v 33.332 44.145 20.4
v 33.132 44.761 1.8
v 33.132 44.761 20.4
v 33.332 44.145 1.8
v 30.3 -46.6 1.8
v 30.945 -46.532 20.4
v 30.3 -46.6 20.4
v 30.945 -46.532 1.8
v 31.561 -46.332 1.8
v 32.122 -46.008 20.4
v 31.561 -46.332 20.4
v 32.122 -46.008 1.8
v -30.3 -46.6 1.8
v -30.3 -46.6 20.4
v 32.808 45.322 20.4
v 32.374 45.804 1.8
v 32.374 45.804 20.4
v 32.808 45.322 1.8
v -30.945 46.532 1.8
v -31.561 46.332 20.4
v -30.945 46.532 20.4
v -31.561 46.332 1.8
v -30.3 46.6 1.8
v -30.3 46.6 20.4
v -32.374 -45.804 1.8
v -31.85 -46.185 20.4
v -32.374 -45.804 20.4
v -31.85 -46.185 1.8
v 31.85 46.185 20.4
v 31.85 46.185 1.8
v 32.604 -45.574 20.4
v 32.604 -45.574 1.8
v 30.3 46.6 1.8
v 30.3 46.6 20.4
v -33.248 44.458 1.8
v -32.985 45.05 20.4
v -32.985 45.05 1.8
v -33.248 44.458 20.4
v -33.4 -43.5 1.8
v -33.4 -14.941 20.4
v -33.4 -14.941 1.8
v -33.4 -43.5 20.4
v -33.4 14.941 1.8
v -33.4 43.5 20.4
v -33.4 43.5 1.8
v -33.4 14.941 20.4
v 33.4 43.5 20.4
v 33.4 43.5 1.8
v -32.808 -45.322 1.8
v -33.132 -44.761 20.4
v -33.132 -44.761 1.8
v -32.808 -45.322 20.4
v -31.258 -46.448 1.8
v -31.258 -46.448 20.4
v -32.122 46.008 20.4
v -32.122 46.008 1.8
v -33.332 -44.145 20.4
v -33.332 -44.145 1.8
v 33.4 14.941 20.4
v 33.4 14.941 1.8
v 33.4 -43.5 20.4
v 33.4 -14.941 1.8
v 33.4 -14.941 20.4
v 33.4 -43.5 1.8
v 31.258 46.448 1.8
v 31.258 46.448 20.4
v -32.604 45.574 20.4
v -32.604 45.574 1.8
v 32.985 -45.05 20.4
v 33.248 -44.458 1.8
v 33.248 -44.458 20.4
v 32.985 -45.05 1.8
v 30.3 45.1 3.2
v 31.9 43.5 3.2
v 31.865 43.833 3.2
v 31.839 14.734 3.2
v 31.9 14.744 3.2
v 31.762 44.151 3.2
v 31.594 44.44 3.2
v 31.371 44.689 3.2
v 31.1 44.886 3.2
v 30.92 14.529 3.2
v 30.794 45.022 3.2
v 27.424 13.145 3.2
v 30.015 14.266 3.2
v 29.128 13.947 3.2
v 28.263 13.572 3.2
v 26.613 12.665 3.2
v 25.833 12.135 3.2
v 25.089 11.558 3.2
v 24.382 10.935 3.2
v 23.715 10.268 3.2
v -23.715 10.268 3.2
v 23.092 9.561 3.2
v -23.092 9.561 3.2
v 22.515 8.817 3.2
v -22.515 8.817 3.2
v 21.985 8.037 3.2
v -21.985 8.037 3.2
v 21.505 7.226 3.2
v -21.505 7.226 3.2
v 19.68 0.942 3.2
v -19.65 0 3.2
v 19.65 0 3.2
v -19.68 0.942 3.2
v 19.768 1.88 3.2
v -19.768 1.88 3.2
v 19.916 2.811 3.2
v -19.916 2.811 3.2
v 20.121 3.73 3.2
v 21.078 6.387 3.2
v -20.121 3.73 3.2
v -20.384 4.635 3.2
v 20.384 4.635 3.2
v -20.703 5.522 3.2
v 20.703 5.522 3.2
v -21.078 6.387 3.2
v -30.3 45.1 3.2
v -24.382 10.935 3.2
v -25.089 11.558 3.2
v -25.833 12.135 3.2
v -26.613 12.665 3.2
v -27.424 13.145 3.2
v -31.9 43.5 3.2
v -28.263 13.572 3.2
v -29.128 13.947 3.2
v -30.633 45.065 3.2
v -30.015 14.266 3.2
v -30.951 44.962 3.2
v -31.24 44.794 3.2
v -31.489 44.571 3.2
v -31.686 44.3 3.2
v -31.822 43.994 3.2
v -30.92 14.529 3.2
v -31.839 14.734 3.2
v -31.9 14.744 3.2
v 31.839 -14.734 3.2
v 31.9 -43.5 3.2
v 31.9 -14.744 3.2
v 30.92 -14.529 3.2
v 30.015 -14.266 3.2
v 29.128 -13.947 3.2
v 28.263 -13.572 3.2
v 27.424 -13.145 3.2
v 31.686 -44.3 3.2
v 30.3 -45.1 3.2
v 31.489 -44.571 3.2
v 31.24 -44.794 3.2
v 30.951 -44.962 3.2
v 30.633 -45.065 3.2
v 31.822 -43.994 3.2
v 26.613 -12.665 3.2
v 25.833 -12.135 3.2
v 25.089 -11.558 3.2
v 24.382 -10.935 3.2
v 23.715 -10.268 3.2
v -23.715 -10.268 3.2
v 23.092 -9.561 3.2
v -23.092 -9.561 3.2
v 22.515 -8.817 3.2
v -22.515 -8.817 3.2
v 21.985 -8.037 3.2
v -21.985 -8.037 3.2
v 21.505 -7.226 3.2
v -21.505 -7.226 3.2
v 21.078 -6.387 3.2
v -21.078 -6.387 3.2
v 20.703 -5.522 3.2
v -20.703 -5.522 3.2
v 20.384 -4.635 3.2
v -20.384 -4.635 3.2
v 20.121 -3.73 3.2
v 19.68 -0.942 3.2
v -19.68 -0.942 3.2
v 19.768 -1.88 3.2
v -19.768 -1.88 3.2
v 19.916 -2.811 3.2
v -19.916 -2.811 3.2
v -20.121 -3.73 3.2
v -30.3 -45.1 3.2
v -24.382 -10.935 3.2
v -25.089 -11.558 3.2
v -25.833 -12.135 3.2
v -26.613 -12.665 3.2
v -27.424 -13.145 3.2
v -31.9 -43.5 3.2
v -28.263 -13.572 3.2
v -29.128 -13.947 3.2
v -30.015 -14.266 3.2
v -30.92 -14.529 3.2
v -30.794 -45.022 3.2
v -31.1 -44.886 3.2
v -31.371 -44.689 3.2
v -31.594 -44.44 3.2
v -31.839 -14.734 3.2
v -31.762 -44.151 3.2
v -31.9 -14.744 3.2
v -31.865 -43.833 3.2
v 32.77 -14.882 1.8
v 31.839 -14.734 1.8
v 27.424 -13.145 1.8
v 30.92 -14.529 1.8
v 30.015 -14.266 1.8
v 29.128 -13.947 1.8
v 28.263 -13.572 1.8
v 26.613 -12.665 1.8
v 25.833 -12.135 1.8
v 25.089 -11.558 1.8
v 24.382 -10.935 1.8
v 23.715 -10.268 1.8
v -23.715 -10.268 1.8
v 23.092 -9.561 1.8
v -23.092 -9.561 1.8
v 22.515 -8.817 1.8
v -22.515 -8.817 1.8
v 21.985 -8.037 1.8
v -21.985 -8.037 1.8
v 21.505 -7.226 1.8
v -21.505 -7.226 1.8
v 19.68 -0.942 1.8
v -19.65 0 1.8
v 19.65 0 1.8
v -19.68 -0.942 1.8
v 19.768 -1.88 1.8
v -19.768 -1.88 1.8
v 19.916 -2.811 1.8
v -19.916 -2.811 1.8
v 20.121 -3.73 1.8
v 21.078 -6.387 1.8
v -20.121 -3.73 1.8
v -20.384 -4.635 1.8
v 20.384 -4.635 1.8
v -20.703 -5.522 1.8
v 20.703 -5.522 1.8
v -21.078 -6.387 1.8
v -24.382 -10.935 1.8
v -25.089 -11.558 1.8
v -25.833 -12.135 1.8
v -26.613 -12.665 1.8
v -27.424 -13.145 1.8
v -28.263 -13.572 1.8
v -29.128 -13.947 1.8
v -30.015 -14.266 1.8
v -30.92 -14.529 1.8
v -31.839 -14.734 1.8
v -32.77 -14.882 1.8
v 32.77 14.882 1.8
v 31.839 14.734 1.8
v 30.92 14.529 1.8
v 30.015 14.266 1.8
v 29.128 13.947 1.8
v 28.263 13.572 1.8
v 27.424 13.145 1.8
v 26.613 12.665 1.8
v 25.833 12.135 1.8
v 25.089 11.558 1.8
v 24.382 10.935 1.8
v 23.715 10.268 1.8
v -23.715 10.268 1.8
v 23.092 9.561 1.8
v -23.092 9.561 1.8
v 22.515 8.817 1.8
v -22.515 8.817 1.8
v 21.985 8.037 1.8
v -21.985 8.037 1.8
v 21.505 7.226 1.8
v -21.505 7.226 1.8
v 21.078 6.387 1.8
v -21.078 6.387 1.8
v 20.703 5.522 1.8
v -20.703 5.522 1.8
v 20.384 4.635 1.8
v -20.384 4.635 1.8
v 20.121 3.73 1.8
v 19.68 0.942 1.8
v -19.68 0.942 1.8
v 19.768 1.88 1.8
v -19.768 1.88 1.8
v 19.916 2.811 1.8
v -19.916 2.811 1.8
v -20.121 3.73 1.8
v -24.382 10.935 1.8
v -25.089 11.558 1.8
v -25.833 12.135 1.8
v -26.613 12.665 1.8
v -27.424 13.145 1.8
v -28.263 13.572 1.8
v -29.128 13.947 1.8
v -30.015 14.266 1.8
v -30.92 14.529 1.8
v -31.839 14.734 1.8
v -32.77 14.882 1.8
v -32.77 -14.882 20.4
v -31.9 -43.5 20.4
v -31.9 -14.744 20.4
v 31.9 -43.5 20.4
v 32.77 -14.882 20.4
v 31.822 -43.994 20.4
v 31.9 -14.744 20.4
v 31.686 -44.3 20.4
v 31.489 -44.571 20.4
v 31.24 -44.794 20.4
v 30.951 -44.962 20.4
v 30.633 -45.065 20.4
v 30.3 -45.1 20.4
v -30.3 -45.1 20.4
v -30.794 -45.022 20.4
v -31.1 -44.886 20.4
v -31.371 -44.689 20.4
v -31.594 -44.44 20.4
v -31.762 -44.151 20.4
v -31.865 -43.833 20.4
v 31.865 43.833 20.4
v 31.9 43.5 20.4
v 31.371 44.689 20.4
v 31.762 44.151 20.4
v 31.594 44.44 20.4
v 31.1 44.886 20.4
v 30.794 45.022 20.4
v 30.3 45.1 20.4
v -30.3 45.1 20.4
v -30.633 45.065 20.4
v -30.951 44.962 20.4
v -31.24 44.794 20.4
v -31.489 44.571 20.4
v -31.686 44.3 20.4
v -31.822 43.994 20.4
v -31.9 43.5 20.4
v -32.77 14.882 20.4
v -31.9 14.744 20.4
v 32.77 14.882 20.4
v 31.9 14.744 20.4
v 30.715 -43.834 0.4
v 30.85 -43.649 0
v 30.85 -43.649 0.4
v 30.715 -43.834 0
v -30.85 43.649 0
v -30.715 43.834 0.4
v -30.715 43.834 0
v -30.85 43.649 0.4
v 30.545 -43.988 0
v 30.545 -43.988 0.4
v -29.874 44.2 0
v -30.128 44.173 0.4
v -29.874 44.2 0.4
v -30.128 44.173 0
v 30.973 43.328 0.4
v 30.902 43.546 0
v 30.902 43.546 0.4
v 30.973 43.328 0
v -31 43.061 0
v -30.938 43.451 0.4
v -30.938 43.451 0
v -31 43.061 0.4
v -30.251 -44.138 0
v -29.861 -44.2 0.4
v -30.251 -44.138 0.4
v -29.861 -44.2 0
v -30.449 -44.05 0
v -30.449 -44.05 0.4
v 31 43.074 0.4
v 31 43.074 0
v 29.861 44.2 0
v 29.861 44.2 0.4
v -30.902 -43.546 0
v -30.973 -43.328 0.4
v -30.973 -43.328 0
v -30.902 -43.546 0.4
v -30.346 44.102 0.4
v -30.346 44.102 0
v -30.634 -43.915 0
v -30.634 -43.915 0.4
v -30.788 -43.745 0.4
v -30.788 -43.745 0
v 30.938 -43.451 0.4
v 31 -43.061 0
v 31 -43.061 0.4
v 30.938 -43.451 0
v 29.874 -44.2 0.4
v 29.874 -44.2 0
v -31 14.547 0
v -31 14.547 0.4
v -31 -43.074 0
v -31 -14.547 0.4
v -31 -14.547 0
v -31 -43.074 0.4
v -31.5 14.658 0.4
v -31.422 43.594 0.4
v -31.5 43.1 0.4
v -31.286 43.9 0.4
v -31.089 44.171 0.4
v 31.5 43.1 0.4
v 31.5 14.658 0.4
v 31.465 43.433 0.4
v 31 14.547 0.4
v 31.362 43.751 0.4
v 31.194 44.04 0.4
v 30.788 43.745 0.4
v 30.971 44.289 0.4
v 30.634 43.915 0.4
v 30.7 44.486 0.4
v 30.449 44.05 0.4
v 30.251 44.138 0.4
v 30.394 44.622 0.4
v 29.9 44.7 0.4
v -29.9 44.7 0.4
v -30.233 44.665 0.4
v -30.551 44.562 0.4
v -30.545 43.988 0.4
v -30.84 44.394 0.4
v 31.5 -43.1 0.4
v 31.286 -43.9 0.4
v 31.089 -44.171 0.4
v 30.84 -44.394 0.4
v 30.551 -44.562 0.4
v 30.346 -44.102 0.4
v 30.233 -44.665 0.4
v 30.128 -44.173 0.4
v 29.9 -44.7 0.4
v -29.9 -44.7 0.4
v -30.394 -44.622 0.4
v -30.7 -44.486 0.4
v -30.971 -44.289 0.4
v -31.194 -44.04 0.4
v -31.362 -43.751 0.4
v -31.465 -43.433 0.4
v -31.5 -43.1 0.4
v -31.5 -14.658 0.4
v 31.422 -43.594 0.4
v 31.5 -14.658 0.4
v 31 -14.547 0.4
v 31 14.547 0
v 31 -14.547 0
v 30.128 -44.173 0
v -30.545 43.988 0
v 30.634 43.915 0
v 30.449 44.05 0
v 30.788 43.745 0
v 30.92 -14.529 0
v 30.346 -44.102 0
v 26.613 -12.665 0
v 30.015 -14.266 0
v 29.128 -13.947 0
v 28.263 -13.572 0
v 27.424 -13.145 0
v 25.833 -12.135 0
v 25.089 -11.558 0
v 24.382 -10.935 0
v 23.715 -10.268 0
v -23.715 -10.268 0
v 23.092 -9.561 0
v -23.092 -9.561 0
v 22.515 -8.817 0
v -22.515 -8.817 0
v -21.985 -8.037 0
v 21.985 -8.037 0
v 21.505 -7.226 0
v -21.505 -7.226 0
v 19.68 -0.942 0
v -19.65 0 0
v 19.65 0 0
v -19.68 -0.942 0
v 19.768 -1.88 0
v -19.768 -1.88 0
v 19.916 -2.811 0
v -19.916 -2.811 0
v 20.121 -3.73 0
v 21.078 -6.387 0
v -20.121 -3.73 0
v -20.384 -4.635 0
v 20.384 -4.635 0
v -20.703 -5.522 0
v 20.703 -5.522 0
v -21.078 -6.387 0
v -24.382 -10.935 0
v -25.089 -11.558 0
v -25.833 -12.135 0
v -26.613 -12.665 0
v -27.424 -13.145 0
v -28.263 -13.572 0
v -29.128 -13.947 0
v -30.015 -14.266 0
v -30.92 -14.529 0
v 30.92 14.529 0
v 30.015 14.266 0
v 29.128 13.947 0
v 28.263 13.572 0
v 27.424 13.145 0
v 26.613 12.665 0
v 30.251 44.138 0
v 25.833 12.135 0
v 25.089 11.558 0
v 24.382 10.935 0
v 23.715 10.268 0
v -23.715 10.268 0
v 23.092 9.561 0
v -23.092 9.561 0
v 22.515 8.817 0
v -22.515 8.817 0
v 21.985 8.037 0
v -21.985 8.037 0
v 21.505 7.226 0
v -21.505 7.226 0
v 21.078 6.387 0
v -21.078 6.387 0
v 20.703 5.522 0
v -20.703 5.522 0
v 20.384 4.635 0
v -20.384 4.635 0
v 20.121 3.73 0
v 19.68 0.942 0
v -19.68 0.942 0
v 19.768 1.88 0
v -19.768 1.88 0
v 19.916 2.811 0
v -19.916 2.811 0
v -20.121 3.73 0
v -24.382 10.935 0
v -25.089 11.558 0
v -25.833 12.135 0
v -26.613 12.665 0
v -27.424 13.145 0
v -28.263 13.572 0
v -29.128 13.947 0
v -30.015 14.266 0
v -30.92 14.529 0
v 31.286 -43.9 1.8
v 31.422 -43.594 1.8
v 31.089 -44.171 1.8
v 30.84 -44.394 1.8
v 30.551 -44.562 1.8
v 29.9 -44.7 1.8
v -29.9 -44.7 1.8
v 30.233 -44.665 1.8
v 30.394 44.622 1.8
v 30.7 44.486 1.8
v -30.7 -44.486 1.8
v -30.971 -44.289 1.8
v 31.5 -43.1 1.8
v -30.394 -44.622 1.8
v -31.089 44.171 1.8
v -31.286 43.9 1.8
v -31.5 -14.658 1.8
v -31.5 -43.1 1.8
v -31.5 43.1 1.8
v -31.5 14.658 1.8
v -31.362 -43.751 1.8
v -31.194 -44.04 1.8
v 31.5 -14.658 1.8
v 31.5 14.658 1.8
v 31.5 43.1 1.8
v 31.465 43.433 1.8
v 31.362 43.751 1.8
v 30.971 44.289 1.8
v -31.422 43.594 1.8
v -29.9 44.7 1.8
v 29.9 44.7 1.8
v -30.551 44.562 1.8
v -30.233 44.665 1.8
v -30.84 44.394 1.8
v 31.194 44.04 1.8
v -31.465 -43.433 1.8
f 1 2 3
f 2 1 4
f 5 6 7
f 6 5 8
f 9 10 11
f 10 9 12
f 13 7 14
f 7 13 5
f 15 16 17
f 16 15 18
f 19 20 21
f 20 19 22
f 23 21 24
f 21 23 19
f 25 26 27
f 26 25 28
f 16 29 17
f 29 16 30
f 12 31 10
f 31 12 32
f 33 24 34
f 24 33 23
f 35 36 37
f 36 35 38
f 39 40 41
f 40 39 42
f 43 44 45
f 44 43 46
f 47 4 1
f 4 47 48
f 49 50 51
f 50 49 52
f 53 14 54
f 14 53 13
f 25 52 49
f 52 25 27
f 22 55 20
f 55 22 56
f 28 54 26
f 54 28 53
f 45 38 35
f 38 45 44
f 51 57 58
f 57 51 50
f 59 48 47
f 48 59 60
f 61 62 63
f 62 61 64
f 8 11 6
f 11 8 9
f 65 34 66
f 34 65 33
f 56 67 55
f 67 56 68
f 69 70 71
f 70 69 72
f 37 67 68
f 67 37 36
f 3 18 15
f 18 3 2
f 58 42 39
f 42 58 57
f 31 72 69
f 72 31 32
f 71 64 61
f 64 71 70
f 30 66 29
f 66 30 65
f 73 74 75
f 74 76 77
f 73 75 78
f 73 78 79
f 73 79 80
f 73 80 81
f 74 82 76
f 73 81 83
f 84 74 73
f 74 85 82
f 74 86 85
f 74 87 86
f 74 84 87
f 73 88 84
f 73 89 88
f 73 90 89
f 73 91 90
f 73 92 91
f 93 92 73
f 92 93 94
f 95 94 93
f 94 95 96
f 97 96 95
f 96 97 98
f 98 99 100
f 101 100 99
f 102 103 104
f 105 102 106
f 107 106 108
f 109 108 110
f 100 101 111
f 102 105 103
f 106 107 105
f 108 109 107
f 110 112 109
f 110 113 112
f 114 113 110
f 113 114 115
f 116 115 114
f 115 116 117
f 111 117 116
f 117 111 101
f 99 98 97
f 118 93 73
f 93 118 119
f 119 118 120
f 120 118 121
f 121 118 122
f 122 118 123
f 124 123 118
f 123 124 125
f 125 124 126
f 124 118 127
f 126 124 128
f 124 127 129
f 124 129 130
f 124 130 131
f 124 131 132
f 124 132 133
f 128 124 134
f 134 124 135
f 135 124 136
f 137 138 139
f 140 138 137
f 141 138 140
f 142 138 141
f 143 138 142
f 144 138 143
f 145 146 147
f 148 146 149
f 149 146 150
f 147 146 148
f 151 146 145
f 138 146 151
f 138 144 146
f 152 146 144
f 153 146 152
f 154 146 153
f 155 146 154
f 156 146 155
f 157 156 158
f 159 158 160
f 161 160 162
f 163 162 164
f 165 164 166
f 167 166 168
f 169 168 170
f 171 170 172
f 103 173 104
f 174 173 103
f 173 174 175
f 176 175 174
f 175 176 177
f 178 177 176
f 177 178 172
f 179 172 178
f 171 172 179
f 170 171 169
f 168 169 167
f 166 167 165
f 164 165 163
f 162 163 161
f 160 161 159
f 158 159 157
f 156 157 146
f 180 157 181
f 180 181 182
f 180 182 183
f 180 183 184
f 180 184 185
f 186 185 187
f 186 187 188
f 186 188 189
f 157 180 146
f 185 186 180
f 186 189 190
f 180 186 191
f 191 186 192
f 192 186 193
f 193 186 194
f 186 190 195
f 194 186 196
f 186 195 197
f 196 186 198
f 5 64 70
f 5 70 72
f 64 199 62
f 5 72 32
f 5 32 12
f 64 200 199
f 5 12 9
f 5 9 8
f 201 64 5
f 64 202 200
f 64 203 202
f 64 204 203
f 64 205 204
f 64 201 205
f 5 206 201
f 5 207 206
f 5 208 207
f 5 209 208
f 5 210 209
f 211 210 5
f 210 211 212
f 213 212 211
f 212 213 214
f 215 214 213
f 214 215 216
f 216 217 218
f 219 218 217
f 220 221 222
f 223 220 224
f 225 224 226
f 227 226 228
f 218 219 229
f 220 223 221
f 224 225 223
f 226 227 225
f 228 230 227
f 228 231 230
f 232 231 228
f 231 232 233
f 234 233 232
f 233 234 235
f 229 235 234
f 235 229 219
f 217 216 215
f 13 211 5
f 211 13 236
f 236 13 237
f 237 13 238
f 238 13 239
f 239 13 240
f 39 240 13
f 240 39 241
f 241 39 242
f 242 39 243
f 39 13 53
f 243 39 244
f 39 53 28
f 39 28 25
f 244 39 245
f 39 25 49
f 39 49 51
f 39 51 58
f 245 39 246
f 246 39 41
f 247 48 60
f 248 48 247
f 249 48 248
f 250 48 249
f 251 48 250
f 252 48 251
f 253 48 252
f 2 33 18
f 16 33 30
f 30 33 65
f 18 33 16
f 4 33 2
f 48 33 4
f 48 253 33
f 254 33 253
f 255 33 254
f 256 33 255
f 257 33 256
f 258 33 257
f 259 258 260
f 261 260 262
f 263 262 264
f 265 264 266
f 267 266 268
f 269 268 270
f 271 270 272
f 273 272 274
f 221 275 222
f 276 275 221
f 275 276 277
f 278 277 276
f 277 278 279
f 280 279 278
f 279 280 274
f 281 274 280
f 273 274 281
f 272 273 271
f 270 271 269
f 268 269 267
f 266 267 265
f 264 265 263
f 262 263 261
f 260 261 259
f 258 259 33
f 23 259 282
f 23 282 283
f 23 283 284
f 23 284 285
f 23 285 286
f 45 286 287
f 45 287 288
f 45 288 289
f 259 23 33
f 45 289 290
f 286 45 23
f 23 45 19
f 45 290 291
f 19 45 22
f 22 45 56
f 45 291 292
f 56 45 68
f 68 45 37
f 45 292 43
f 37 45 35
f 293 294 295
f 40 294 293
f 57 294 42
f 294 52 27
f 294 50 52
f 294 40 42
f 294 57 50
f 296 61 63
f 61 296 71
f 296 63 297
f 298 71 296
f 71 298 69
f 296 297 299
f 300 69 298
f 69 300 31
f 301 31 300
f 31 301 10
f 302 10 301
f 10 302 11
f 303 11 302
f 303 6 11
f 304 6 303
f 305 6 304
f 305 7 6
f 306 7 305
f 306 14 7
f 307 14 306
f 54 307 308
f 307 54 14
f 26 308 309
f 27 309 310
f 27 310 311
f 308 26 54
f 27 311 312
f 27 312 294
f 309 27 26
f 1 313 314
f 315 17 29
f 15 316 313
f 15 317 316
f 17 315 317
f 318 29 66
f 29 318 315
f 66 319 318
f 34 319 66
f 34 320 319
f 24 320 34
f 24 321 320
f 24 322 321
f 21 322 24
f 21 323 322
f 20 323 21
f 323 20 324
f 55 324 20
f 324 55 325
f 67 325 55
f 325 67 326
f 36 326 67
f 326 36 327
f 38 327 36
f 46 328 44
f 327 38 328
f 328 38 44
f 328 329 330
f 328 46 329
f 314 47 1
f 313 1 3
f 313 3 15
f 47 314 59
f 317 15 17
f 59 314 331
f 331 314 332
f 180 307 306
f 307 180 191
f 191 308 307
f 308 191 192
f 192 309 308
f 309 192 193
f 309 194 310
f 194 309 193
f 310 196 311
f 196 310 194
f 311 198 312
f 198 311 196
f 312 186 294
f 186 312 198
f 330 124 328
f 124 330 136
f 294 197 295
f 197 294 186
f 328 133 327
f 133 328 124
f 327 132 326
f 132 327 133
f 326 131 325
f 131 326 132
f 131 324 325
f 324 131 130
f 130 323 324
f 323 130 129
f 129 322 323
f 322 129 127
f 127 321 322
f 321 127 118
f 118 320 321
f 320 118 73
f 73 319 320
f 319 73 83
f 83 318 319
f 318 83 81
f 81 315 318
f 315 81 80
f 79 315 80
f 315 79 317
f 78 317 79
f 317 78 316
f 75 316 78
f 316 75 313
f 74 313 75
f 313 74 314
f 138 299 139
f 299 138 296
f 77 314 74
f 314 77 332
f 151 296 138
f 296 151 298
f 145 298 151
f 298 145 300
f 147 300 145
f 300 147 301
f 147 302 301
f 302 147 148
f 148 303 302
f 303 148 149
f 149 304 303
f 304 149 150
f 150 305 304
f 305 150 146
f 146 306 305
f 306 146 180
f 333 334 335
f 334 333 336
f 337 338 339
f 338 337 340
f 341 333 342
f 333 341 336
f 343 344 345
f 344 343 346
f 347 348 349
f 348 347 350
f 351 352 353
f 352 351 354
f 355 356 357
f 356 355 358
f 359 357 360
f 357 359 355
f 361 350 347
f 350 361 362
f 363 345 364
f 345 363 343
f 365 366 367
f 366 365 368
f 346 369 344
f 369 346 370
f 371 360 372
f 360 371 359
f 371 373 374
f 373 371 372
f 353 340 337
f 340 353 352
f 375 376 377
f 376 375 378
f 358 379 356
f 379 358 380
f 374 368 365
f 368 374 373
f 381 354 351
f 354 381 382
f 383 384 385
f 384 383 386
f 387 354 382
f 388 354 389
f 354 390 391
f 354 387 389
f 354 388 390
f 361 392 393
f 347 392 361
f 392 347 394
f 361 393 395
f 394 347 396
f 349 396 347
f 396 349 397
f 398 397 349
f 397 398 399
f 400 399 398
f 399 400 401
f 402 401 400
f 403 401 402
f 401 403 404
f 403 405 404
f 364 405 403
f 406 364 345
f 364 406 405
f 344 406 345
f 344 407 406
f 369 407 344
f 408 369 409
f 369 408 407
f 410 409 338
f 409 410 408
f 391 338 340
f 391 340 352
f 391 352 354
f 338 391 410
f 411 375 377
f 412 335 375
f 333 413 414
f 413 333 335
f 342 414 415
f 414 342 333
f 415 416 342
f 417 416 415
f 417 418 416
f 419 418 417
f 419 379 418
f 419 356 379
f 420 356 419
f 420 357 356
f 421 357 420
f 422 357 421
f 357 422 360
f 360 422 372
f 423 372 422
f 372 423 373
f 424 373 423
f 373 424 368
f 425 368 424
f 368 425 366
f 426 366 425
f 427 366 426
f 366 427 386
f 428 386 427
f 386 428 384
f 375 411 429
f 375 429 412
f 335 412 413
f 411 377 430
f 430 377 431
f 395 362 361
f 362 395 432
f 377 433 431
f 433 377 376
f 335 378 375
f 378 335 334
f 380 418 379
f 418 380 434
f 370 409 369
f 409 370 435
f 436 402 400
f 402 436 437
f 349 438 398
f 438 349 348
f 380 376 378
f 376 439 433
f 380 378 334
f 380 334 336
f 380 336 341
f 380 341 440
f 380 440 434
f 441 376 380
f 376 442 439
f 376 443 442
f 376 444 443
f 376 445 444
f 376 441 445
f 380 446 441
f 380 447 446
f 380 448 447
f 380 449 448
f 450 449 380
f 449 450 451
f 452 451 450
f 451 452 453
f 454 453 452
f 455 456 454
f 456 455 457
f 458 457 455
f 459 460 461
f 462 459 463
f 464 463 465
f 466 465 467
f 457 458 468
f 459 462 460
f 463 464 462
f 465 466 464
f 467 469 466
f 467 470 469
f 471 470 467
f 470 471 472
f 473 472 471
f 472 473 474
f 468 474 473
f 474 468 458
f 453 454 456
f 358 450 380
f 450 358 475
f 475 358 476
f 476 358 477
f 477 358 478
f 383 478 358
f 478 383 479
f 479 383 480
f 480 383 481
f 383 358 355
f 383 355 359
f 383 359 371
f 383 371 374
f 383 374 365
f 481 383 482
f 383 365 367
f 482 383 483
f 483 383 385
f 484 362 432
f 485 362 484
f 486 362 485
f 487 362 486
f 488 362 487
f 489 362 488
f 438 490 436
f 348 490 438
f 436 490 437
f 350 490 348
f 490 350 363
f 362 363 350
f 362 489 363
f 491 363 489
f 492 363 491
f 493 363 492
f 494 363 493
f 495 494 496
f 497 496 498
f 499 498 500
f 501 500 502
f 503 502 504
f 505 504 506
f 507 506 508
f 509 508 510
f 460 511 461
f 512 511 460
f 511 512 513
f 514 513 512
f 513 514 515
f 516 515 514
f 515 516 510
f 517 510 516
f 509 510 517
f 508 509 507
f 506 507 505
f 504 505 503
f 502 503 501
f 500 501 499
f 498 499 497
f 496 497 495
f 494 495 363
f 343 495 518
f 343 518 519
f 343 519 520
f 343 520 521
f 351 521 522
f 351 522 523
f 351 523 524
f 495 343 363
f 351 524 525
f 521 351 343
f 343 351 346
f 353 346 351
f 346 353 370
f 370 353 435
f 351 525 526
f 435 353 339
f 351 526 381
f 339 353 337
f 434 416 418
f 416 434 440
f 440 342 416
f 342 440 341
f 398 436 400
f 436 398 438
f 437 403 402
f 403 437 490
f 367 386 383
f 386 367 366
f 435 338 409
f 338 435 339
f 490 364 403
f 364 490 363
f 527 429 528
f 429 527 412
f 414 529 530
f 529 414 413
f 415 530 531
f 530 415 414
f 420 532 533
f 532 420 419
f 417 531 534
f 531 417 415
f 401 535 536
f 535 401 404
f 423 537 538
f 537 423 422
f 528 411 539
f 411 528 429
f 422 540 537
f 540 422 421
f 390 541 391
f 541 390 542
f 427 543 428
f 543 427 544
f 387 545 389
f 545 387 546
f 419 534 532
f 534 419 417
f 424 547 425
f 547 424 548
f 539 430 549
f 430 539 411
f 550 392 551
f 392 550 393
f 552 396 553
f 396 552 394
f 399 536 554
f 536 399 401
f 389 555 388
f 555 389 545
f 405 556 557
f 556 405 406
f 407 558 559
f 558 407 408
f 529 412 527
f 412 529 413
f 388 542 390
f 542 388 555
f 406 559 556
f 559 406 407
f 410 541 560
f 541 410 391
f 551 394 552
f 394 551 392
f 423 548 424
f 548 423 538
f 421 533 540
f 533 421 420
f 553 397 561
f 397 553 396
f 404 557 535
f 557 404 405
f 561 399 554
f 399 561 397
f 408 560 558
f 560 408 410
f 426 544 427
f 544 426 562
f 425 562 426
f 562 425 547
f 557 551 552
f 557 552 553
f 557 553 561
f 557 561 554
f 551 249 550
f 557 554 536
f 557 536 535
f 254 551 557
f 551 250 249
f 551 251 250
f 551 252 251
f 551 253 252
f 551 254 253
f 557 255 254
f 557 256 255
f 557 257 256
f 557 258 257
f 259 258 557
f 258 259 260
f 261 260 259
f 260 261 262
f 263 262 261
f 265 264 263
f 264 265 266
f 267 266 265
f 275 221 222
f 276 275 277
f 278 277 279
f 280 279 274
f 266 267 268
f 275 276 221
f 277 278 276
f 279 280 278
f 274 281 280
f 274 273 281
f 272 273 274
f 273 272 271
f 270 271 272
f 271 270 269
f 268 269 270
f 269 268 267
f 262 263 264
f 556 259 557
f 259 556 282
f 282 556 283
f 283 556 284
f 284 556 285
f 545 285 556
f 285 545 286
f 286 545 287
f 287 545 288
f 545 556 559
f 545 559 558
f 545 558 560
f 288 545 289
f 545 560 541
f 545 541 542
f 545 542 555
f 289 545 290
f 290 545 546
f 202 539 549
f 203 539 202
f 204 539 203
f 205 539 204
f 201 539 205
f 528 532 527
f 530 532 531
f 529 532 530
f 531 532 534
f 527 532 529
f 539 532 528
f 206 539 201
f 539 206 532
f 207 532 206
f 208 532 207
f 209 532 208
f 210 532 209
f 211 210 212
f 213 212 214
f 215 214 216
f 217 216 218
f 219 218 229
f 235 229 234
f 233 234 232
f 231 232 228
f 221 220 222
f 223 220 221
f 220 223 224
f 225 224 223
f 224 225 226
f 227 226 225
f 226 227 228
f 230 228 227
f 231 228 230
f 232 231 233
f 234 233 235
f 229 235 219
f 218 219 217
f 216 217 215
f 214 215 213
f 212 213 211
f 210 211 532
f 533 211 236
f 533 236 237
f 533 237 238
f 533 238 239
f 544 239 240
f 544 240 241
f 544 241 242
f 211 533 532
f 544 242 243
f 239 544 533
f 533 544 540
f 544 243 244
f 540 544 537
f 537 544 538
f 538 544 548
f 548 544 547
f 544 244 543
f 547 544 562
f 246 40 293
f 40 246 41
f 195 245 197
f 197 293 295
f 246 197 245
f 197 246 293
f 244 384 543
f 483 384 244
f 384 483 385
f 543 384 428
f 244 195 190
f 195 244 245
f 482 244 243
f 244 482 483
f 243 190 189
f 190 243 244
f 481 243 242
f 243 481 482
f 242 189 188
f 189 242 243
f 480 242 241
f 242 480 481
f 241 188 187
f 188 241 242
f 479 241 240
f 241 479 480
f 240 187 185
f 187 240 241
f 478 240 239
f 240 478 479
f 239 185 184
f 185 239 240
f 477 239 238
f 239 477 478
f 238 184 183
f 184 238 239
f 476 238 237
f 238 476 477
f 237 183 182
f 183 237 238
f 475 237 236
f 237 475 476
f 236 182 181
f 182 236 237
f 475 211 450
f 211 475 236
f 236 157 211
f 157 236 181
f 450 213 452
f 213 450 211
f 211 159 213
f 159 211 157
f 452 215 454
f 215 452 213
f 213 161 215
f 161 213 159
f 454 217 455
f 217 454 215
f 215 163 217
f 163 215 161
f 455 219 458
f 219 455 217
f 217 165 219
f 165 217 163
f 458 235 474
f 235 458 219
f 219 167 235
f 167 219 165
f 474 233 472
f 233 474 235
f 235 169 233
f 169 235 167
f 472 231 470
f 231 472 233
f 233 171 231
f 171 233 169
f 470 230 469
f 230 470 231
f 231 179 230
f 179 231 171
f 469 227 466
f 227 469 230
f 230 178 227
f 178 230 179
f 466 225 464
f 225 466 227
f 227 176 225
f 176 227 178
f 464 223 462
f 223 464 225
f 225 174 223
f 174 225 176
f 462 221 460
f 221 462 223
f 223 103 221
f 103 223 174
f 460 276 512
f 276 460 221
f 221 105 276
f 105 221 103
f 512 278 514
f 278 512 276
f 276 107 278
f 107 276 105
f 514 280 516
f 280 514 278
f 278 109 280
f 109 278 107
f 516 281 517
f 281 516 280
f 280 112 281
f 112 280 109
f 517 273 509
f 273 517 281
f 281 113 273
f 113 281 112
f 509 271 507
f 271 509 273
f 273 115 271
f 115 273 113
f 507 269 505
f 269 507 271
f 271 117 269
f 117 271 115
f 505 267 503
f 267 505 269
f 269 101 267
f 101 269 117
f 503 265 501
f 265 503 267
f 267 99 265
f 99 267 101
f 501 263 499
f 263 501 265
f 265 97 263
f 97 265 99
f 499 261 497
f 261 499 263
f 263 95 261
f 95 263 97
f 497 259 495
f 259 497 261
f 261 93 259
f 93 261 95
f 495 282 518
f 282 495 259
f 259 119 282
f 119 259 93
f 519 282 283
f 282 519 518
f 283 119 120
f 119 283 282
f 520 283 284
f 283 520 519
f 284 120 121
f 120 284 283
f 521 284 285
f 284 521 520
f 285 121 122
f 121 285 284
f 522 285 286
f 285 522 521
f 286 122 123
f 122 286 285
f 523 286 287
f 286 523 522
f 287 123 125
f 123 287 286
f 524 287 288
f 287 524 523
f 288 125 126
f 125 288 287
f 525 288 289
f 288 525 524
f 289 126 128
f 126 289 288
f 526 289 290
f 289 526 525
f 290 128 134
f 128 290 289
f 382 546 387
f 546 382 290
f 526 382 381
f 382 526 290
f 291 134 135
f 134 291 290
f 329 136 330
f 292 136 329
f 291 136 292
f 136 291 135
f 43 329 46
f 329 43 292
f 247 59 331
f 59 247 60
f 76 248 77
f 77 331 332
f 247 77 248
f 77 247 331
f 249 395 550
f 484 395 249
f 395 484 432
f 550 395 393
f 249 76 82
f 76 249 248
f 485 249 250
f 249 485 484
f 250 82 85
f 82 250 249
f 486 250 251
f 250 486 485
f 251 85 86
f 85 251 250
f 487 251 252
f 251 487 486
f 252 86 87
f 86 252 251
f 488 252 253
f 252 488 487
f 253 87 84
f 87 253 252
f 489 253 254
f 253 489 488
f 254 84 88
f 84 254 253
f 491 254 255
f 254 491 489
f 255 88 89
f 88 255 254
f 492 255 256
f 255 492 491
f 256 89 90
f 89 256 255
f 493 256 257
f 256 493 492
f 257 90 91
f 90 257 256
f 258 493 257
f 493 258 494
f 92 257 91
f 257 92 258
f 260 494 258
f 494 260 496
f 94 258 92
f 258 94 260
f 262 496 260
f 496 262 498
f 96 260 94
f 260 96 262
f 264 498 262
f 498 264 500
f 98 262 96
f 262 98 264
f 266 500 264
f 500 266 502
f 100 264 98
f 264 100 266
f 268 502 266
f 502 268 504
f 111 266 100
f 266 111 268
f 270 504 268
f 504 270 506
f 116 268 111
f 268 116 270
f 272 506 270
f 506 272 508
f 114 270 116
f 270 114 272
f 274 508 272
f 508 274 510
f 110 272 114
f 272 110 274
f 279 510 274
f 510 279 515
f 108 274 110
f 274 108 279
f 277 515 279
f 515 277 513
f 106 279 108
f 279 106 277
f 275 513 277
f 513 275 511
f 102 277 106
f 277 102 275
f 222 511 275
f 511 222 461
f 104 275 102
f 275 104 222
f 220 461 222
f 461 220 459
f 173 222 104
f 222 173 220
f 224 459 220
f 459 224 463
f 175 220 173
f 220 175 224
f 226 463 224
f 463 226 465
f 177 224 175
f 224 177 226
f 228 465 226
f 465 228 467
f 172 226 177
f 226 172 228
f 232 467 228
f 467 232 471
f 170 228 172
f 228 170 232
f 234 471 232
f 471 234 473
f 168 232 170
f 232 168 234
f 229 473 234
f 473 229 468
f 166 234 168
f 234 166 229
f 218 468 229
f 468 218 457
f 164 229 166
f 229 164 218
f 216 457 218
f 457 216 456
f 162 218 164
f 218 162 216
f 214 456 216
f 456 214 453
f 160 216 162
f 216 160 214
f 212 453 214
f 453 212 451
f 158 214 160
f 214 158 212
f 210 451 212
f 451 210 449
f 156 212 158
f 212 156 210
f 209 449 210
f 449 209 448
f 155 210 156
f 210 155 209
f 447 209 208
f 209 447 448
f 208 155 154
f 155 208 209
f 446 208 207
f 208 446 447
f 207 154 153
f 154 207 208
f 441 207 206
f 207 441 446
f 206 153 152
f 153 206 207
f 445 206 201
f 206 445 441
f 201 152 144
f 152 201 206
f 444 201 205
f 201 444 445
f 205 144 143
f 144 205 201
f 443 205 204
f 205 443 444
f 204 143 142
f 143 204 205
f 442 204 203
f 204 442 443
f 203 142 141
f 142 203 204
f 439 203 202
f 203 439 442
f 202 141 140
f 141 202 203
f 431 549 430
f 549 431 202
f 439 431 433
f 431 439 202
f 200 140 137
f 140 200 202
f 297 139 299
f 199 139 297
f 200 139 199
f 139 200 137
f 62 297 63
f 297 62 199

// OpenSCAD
eps = 0.0001;
$fn = 30;

coin_d = 19;
coin_height = 2.4;

foot = 0.5;

module coin_2d() {
  $fn = 100;
  difference() {
    circle(d=coin_d);
    scale([0.75, 1])
      rotate([0, 0, 45])
        square(coin_d*0.42, center=true);
  }
}

module coin() {
  linear_extrude(0.2)
    offset(-foot)
      coin_2d();
  translate([0, 0, 0.2])
    linear_extrude(coin_height - 0.2)
      coin_2d();
}

card_width = 63;
card_height = 89.4;

cavity_slack = 0.8;
wall = 1.5;
flor = 1.4;
deck_thickness = 13;
height_slack = 4.2;

roundoff = 1.6;
protrusion = 1.8;

module cavity_2d() {
  offset(roundoff)
    offset(-roundoff)
      square([card_width + cavity_slack, card_height + cavity_slack], center=true);
}

module protrusion_2d() {
  offset(roundoff)
    offset(-roundoff)
      square([card_width, card_height], center=true);
}

module box_2d() {
 offset(roundoff + wall)
   offset(-roundoff - wall)
     square([card_width + cavity_slack + wall*2, card_height + cavity_slack + wall*2], center=true);
}

module fingers_2d() {
  $fn = 100;
  for (a = [-1, 1])
    scale([a, 1])
      translate([card_width*0.55, 0, 0])
        circle(15);
}

module box() {
  linear_extrude(0.4)
    offset(-foot)
      protrusion_2d();
  
  translate([0, 0, 0.4])
    linear_extrude(protrusion - 0.4)
      protrusion_2d();
  
  translate([0, 0, protrusion]) {
    linear_extrude(flor)
      box_2d();
  
    translate([0, 0, flor]) {
      linear_extrude(deck_thickness + height_slack) {
        difference() {
          box_2d();
          cavity_2d();
        }
      }
    }
  }
}

module piece() {
  difference() {
    box();
    translate([0, 0, -1])
      linear_extrude(100)
        fingers_2d();
  }
}

piece();
